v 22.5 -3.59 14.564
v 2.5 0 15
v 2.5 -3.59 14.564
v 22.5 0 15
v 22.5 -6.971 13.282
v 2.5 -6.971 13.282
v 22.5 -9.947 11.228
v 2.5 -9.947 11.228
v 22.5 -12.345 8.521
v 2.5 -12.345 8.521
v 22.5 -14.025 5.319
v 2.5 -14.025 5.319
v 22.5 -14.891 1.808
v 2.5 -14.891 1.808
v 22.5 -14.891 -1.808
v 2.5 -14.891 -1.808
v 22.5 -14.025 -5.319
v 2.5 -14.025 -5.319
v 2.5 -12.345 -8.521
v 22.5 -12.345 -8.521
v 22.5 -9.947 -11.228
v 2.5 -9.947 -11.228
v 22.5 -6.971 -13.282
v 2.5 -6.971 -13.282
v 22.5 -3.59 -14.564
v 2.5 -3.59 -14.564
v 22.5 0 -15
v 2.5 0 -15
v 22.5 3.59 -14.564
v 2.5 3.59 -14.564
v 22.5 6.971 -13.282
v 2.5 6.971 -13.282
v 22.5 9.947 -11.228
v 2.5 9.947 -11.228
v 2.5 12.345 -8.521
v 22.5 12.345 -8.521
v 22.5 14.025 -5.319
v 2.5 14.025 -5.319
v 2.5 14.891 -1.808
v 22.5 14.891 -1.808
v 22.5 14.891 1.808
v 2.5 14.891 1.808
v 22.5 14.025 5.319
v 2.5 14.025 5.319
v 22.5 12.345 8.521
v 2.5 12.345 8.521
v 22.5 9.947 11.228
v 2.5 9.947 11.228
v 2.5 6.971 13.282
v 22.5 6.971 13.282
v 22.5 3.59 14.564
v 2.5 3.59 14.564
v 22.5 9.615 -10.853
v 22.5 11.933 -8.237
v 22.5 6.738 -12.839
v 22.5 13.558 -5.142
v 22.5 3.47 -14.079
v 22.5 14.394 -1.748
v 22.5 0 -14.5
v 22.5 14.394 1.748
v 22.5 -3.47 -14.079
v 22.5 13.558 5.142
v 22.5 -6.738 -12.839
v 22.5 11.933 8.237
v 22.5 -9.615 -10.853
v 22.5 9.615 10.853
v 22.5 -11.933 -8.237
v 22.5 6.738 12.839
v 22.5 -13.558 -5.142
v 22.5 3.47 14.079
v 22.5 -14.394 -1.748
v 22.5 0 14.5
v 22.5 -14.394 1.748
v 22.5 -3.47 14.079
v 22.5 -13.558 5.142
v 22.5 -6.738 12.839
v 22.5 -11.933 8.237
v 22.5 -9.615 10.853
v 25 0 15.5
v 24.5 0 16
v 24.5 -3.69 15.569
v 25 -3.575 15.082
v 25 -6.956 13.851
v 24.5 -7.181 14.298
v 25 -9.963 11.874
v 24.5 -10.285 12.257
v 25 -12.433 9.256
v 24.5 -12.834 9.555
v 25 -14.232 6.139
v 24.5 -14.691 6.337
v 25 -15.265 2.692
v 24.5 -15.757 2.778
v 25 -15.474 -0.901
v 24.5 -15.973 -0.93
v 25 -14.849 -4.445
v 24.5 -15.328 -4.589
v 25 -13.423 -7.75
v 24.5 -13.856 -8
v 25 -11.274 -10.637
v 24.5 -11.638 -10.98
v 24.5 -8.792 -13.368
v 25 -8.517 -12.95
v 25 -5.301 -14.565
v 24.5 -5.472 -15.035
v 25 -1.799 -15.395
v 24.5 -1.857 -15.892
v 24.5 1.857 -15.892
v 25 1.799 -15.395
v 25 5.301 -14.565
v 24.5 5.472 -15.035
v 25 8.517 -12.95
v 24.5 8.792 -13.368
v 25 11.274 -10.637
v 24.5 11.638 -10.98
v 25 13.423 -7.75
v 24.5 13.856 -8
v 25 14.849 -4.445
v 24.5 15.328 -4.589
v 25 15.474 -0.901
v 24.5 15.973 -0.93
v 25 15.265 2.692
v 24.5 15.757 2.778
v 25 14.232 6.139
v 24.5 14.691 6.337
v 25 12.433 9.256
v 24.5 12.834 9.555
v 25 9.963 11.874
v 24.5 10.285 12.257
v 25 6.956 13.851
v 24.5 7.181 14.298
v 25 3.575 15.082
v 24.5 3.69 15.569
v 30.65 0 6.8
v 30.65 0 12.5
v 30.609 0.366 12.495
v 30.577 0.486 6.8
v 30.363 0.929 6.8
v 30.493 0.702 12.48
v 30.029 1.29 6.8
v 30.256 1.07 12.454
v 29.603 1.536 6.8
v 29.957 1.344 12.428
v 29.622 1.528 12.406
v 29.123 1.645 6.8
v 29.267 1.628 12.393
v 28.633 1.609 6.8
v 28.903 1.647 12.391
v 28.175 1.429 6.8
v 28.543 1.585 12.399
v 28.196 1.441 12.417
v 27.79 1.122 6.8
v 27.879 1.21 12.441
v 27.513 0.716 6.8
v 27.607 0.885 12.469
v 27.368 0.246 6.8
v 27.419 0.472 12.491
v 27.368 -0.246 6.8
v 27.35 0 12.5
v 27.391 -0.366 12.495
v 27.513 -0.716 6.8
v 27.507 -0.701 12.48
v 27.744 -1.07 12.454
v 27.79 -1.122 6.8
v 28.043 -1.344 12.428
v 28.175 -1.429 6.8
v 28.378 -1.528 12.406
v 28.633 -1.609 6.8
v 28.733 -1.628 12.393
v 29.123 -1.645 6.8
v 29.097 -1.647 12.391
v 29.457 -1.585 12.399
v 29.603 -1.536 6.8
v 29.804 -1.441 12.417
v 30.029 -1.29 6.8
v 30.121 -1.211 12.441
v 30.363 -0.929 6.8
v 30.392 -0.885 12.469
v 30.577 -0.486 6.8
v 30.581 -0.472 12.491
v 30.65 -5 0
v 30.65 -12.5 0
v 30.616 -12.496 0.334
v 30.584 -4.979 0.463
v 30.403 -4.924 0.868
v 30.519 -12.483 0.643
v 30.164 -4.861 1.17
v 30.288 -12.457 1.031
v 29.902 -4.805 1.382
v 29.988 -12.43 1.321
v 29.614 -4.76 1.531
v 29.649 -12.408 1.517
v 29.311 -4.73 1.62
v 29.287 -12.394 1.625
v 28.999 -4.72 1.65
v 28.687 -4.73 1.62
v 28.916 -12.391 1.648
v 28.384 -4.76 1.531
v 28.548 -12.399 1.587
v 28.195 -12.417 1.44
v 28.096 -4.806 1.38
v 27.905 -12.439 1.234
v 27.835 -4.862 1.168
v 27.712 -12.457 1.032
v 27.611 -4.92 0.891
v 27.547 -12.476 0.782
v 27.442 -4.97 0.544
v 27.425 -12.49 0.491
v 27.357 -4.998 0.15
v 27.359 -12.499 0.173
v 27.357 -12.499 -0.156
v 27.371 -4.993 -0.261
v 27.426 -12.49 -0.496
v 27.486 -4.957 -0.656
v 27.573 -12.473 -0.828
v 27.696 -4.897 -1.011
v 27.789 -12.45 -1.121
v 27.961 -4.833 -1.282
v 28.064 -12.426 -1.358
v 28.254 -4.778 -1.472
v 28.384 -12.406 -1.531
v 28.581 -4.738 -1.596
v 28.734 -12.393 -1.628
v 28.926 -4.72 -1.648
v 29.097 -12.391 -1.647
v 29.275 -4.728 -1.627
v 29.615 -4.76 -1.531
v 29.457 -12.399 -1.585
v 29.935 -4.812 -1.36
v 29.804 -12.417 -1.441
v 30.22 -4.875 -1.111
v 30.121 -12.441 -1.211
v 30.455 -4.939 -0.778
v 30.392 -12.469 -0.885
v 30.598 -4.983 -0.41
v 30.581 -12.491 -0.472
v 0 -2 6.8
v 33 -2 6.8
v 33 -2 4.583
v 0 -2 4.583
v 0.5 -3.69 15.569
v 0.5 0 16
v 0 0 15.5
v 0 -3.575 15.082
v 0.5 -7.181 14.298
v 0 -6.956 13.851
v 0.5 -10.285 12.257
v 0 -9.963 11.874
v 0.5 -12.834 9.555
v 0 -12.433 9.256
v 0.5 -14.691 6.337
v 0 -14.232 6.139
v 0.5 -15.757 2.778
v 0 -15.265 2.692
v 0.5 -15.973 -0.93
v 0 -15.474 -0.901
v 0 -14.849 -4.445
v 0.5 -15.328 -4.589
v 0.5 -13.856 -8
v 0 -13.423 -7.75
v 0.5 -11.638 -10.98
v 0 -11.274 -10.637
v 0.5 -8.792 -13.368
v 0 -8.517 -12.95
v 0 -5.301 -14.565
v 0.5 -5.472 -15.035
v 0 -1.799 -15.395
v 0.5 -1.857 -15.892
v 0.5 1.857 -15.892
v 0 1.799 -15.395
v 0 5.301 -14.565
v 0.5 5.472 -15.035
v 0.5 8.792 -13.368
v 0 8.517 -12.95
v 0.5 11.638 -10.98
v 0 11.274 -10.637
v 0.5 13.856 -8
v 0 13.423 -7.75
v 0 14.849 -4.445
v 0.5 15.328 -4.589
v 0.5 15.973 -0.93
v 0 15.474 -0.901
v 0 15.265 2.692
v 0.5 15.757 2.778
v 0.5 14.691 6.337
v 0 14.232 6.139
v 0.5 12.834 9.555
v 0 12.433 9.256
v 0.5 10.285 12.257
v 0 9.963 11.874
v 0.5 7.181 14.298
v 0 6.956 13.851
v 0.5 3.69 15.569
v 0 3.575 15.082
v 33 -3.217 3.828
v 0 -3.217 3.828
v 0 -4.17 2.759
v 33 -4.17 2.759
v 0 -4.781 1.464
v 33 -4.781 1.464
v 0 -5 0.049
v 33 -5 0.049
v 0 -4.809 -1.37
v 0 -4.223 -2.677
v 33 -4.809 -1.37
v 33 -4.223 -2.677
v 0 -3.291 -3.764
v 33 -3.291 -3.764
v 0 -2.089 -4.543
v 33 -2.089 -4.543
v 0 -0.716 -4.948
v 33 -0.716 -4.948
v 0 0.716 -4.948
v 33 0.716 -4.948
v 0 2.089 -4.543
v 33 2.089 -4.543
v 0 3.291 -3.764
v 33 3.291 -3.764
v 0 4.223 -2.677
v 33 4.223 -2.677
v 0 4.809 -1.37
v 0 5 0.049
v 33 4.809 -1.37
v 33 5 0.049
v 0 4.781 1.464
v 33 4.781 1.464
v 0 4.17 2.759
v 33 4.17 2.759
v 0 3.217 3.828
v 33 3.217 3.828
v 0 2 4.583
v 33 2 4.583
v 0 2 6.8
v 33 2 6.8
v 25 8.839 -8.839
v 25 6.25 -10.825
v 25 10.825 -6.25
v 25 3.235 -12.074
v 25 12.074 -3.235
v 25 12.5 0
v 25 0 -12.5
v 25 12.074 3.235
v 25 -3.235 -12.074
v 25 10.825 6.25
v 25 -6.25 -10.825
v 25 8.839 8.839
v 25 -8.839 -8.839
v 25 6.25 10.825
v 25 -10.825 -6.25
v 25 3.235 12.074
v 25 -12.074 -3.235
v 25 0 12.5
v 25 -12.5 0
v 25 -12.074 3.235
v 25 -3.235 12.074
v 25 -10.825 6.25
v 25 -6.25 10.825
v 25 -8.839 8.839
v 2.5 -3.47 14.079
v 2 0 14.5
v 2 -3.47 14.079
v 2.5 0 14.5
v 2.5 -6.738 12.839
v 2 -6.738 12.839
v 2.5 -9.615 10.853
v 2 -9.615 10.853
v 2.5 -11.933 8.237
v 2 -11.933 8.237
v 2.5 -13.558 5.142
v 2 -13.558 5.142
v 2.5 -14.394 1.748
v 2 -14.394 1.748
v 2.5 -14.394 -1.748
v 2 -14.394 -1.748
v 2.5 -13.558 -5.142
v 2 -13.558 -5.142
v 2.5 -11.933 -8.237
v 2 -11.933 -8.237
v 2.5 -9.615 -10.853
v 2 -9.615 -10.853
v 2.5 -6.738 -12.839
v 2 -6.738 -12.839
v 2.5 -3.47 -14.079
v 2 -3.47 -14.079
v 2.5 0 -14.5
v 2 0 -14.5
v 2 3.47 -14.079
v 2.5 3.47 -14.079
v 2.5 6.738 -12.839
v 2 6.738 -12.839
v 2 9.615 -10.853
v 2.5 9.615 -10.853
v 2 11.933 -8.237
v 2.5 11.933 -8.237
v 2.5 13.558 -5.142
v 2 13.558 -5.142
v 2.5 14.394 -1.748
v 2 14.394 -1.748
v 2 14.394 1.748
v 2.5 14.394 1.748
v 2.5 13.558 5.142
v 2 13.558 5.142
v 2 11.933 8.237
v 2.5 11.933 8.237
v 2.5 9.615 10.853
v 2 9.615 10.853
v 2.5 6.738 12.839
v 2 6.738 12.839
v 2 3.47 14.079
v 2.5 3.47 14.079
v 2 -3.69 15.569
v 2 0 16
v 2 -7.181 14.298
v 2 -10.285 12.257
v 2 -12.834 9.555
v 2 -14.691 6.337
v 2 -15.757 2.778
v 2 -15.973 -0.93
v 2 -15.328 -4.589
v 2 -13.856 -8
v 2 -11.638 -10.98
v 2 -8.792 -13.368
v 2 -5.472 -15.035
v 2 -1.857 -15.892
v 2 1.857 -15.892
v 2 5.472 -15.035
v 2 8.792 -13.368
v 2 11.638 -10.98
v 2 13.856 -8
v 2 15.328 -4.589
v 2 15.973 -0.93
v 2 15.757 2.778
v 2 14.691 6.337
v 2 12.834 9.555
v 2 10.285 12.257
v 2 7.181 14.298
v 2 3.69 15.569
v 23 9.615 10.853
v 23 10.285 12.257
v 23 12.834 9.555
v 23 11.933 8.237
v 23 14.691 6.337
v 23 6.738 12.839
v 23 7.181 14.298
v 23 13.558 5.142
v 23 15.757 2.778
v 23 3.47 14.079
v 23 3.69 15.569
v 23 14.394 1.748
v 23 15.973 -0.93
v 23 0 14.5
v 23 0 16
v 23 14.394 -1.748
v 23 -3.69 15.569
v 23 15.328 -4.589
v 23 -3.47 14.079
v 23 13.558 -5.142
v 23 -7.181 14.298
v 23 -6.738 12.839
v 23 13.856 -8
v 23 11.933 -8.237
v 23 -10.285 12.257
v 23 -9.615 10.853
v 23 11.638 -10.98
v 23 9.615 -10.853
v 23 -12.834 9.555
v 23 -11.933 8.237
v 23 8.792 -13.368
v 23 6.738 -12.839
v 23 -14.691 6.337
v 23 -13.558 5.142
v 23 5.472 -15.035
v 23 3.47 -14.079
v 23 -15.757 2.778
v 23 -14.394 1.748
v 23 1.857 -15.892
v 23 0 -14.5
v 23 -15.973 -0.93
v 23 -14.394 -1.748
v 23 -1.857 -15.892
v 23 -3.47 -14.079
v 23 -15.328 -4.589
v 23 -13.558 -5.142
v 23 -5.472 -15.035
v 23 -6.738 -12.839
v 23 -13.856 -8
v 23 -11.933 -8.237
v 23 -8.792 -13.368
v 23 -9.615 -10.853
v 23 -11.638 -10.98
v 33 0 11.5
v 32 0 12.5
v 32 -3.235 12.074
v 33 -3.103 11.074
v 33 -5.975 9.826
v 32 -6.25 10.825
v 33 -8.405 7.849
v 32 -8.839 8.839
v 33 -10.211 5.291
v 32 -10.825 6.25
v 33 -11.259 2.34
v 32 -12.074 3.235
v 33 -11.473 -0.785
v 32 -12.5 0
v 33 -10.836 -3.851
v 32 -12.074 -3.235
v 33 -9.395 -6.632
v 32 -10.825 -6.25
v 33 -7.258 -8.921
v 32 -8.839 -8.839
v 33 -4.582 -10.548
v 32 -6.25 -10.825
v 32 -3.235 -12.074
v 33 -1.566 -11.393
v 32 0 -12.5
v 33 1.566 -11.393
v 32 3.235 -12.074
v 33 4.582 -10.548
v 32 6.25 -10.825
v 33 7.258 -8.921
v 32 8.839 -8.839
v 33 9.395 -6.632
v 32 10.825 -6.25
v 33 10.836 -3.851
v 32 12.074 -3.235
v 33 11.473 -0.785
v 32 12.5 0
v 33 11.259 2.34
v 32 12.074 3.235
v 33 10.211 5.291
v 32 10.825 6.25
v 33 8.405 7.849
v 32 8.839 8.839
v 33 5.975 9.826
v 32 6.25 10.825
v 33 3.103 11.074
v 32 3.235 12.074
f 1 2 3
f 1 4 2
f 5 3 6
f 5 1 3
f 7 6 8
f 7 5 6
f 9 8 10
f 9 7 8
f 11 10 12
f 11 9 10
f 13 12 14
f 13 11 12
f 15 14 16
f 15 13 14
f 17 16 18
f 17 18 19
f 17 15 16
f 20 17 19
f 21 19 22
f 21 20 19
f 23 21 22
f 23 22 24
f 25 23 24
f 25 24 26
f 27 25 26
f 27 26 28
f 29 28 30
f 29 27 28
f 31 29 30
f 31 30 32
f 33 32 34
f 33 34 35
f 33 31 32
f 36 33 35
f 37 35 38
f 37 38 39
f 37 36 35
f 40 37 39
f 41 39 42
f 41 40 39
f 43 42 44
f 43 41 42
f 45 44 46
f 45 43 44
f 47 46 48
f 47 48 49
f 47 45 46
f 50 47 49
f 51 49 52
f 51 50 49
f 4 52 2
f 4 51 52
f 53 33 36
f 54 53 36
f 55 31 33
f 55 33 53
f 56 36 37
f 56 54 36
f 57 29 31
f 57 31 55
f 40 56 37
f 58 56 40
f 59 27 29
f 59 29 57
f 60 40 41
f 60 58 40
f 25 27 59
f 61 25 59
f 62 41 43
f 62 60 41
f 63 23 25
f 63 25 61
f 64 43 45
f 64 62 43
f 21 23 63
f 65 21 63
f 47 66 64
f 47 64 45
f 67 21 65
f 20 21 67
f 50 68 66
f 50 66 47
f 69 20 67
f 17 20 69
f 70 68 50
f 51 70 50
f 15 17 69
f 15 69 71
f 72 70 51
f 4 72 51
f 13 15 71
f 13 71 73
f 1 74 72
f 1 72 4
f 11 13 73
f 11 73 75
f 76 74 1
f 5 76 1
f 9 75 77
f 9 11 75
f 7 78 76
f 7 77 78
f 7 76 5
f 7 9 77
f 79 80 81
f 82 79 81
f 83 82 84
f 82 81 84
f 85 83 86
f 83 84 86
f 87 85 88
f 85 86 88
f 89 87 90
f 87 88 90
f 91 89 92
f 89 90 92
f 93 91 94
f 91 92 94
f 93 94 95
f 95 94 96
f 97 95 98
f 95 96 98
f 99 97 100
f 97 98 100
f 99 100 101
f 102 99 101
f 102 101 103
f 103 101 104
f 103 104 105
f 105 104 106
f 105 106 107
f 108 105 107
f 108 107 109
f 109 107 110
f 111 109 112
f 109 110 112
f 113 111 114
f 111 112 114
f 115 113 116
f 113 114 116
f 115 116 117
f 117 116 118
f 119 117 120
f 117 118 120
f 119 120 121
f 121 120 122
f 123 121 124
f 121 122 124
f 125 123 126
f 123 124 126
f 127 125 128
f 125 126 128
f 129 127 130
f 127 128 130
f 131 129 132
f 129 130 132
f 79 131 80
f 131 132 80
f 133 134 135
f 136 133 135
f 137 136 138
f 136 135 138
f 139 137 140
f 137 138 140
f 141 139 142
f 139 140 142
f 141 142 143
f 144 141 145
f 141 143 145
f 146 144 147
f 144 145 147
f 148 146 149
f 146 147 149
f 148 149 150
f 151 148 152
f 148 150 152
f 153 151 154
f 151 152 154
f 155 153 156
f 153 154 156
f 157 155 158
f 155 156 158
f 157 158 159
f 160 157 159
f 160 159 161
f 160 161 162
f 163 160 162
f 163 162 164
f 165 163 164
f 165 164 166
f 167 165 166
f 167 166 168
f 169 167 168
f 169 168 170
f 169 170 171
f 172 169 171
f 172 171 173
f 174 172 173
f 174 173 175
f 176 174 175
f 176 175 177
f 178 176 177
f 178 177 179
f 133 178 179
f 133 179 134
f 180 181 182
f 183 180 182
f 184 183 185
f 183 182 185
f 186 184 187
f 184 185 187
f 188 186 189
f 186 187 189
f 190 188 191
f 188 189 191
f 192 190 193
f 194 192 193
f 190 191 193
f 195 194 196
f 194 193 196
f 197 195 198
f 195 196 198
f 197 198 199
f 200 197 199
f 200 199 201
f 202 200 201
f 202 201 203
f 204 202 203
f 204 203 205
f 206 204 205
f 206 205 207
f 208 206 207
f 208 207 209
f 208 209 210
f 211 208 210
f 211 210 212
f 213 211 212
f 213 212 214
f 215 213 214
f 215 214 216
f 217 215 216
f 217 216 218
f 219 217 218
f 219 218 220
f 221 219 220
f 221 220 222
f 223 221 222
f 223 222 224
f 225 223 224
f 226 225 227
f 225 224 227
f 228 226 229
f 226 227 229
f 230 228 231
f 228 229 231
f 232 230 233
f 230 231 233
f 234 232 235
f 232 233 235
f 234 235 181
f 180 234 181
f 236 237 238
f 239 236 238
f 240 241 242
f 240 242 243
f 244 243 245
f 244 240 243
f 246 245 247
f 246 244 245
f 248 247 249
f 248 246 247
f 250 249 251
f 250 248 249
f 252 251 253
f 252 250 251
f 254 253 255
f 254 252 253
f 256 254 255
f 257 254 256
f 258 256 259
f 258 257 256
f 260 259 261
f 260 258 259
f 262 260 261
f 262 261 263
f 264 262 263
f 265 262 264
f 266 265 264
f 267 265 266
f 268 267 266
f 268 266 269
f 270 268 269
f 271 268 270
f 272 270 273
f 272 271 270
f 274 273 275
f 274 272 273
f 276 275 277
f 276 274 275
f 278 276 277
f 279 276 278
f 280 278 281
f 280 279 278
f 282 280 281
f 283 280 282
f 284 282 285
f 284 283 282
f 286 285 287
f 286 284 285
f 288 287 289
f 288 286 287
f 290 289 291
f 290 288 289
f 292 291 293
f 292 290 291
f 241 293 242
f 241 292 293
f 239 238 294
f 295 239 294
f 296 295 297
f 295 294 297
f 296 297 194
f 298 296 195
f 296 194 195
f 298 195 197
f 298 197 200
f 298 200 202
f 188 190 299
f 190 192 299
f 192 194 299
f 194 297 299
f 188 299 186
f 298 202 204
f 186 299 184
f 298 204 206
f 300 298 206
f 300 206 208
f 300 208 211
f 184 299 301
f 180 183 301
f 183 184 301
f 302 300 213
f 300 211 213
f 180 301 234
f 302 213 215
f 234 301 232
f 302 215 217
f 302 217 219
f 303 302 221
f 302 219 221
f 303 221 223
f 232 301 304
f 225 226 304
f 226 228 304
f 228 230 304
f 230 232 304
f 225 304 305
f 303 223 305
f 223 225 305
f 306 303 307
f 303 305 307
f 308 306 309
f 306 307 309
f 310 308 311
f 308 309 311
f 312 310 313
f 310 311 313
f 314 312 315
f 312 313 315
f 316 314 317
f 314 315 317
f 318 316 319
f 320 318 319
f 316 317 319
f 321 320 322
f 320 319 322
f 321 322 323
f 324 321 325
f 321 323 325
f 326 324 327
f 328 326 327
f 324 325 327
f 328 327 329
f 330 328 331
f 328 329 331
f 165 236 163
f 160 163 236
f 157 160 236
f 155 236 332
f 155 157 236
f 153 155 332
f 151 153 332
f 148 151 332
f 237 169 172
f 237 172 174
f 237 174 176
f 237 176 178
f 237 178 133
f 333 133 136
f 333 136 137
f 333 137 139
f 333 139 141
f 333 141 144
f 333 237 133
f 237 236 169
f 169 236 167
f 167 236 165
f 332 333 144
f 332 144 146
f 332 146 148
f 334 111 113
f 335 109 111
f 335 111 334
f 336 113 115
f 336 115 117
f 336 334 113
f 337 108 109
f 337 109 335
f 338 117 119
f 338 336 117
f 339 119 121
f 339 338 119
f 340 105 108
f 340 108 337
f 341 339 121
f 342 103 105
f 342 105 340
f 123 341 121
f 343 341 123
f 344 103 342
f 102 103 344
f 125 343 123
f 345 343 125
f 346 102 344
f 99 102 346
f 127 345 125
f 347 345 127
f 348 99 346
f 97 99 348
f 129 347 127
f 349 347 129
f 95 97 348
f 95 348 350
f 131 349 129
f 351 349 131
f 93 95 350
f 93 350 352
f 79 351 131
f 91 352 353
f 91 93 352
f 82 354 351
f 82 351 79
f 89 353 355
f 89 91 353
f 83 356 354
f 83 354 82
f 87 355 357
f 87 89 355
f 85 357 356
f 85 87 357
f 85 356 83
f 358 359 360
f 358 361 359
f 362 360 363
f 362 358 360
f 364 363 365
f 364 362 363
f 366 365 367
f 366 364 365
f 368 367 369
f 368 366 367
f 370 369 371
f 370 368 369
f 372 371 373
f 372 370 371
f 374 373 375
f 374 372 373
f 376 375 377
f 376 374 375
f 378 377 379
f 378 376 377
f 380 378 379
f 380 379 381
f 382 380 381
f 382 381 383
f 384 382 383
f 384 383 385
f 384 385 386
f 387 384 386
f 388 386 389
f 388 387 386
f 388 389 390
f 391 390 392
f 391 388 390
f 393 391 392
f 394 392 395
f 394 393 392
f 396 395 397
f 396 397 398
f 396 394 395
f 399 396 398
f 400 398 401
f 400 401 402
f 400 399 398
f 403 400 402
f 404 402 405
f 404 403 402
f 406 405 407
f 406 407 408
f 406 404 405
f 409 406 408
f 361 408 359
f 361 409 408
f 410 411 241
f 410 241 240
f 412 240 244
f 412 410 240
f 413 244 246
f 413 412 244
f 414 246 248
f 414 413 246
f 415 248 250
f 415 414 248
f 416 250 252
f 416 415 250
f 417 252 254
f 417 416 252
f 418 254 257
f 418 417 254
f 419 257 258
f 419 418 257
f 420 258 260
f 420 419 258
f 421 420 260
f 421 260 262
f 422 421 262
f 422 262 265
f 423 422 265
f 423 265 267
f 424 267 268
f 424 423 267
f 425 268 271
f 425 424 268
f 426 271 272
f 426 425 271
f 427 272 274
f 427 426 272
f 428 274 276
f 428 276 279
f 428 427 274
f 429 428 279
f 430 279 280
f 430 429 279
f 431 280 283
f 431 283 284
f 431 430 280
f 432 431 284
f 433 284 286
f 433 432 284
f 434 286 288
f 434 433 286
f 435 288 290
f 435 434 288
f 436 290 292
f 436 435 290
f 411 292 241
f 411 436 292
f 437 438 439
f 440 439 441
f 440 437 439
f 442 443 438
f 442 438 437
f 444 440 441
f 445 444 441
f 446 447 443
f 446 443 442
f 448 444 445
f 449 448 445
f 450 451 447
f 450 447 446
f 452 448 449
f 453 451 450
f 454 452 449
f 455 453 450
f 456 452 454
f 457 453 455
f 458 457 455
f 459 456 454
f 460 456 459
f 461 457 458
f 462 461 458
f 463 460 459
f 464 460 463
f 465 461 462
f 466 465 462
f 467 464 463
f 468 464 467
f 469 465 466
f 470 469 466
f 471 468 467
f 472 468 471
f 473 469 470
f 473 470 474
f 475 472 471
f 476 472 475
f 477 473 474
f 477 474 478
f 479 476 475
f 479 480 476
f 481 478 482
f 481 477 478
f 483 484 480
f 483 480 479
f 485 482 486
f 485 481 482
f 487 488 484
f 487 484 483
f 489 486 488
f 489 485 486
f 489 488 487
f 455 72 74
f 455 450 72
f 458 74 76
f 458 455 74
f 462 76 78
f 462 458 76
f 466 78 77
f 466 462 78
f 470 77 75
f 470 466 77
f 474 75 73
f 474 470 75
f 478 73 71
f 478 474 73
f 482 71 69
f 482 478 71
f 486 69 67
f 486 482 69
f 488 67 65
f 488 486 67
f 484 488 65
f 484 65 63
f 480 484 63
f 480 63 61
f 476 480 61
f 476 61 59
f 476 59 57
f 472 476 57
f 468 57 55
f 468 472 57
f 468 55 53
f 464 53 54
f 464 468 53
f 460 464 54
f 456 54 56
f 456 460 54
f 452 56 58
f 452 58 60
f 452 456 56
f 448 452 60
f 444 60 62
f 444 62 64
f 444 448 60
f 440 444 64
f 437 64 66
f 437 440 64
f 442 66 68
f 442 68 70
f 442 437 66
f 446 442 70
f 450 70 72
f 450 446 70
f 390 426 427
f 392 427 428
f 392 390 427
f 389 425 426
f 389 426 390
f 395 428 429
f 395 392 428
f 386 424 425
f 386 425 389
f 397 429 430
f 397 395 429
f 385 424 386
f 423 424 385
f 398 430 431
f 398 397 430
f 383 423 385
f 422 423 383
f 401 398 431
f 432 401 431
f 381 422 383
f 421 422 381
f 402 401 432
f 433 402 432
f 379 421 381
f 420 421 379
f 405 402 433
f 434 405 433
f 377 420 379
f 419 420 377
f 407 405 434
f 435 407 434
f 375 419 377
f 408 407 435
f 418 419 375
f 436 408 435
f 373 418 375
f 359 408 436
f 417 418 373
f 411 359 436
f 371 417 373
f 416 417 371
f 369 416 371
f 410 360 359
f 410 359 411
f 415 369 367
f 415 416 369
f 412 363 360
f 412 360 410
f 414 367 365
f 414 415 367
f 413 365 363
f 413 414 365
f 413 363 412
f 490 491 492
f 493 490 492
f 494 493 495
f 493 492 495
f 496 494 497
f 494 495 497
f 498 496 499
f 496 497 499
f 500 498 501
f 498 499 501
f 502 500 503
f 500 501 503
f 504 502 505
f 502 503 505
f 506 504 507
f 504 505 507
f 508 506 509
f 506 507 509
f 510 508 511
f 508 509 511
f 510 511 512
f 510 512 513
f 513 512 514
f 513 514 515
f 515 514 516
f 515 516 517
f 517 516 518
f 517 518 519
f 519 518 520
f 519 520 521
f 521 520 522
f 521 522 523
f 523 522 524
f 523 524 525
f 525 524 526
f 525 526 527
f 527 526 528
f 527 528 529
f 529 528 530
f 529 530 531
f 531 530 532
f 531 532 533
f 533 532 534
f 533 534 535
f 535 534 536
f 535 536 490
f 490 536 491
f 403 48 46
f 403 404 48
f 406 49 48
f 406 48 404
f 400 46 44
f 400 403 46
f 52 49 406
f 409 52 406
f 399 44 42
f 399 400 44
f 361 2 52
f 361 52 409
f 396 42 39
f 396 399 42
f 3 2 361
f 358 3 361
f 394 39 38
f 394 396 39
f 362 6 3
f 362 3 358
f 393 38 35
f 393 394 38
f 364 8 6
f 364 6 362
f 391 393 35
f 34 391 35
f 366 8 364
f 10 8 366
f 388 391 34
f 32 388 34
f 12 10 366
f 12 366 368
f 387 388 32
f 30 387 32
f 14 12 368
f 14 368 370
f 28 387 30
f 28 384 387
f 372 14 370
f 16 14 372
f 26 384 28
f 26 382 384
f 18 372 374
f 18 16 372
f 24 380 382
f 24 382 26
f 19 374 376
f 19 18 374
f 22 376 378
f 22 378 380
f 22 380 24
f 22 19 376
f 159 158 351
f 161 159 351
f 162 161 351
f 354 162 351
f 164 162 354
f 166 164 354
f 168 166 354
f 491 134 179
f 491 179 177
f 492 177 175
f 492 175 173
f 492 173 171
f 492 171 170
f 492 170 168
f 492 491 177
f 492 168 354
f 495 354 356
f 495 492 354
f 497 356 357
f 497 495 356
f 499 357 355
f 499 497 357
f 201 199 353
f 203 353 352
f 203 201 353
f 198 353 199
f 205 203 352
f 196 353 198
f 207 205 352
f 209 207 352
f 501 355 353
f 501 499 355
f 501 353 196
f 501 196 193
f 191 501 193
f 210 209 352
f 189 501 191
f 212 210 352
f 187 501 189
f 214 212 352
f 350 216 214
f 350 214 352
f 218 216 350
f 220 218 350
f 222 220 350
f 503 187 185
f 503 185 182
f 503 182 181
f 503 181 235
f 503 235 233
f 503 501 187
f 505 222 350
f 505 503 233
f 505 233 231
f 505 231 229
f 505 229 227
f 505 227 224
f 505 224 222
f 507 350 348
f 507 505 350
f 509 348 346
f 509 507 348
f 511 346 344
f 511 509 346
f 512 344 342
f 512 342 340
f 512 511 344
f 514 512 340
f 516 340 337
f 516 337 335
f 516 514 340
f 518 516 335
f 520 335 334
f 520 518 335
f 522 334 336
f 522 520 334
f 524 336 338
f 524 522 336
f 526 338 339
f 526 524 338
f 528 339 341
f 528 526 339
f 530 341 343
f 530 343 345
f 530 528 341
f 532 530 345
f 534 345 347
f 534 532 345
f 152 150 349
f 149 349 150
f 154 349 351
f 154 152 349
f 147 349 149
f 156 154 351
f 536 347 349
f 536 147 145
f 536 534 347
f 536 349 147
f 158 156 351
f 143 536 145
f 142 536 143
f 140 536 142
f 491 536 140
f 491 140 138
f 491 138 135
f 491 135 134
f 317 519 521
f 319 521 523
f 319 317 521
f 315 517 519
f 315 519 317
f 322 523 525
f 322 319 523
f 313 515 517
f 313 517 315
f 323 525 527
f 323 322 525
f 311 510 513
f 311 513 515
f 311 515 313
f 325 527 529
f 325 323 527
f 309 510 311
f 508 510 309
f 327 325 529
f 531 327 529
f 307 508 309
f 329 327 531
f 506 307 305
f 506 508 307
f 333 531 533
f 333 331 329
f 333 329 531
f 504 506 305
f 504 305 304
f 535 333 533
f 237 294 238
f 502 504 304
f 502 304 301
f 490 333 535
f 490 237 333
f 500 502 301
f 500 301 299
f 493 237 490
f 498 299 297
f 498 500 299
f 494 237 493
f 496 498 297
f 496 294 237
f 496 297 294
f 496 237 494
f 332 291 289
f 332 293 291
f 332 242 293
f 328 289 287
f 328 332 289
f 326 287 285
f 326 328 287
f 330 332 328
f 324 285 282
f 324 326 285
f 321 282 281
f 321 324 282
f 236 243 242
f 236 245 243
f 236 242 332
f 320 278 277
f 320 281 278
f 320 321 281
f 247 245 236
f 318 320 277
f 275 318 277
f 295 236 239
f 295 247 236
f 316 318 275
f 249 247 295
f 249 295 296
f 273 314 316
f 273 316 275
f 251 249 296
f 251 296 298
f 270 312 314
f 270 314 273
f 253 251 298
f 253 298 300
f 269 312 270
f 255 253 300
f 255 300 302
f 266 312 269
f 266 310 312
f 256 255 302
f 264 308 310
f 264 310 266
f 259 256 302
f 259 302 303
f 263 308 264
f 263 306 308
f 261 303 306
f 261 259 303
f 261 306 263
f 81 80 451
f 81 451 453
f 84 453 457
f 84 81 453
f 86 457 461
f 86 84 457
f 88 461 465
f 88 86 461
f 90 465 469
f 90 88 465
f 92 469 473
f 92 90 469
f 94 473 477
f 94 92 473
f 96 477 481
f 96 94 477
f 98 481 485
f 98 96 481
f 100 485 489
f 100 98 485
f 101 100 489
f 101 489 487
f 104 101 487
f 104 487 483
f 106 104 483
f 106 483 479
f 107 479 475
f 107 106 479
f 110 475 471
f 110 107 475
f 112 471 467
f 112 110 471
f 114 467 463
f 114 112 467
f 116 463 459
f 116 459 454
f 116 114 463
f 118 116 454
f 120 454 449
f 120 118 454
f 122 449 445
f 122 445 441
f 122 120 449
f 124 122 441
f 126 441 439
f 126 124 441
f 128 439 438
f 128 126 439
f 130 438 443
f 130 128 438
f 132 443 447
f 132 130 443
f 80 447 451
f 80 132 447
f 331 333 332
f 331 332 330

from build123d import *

# Parameters (mm, degrees)
SKETCH2_W                  = 33
SKETCH2_H                  = 5
SKETCH3_W                  = 2.217424305
SKETCH3_H                  = 4
CUT_EXTRUDE1_DEPTH         = 41.012498047
M4X0_7_TAPPED_HOLE1_REACH  = 48.446
M4X0_7_TAPPED_HOLE1_BORE_R = 1.65
CIRPATTERN1_COUNT          = 2
CIRPATTERN1_ANGLE          = 90
CHAMFER1_SIZE              = 1
CHAMFER2_SIZE              = 0.5


with BuildPart() as part:
    # Sketch1 → Revolve1 (revolve)
    with BuildSketch(Plane.XY, mode=Mode.PRIVATE) as revolve1_sk:
        Polygon((0, 0), (0, 16), (2, 16), (2, 14.5), (2.5, 14.5), (2.5, 15), (22.5, 15), (22.5, 14.5), (23, 14.5), (23, 16), (25, 16), (25, 12.5), (33, 12.5), (33, 0), align=None)
    revolve(revolve1_sk.sketch.rotate(Axis((-28.053191665, 0, 0), (1, 0, 0)), 90), axis=Axis((-28.053191665, 0, 0), (1, 0, 0)))

    # Sketch2 → Cut-Revolve1 (revolve, cut)
    with BuildSketch(Plane.XY, mode=Mode.PRIVATE) as cut_revolve1_sk:
        with Locations((16.5, 2.5)):
            Rectangle(SKETCH2_W, SKETCH2_H)
    revolve(cut_revolve1_sk.sketch.rotate(Axis((-6.491818973, 0, 0), (1, 0, 0)), 90), axis=Axis((-6.491818973, 0, 0), (1, 0, 0)), mode=Mode.SUBTRACT)

    # Sketch3 → Cut-Extrude1 (cut, through all)
    with BuildSketch(Plane(origin=(33, 0, 0), x_dir=(0, 0, -1), z_dir=(1, 0, 0))):
        with Locations((-5.691287847, 0)):
            Rectangle(SKETCH3_W, SKETCH3_H)
    extrude(amount=-CUT_EXTRUDE1_DEPTH, mode=Mode.SUBTRACT)

    # M4x0.7 Tapped Hole1 bore → M4x0.7 Tapped Hole1 (cut, up to next)
    with BuildSketch(Plane.XY.offset(12.5), mode=Mode.PRIVATE) as m4x0_7_tapped_hole1_sk1:
        with Locations((29, 0)):
            Circle(M4X0_7_TAPPED_HOLE1_BORE_R)
    m4x0_7_tapped_hole1_tool1 = extrude(m4x0_7_tapped_hole1_sk1.sketch, amount=-M4X0_7_TAPPED_HOLE1_REACH, mode=Mode.PRIVATE) & part.part
    m4x0_7_tapped_hole1 = m4x0_7_tapped_hole1_tool1.solids().sort_by_distance((29, 0, 12.5))[0]
    add(m4x0_7_tapped_hole1, mode=Mode.SUBTRACT)

    # CirPattern1: M4x0.7 Tapped Hole1; each copy of M4x0.7 Tapped Hole1 runs up to whatever stops it at its own place
    cirpattern1_before = part.part  # the part as the pattern finds it: every copy runs up to it
    cirpattern1_m4x0_7_tapped_hole1_long = extrude(m4x0_7_tapped_hole1_sk1.sketch, amount=-M4X0_7_TAPPED_HOLE1_REACH, mode=Mode.PRIVATE)
    cirpattern1_m4x0_7_tapped_hole1_tool1 = cirpattern1_m4x0_7_tapped_hole1_long.rotate(Axis((-6.491818973, 0, 0), (1, 0, 0)), 1 * CIRPATTERN1_ANGLE / (CIRPATTERN1_COUNT - 1)) & cirpattern1_before
    add(cirpattern1_m4x0_7_tapped_hole1_tool1.solids().sort_by_distance((29, -12.5, 0))[0], mode=Mode.SUBTRACT)

    # Chamfer1
    chamfer1_edges = [part.edges().sort_by_distance(p)[0] for p in [
        (33, 0, -12.5),
    ]]
    chamfer(chamfer1_edges, length=CHAMFER1_SIZE)

    # Chamfer2
    chamfer2_edges = [part.edges().sort_by_distance(p)[0] for p in [
        (25, 0, -16),
        (0, 0, -16),
    ]]
    chamfer(chamfer2_edges, length=CHAMFER2_SIZE)


solid = part.part
